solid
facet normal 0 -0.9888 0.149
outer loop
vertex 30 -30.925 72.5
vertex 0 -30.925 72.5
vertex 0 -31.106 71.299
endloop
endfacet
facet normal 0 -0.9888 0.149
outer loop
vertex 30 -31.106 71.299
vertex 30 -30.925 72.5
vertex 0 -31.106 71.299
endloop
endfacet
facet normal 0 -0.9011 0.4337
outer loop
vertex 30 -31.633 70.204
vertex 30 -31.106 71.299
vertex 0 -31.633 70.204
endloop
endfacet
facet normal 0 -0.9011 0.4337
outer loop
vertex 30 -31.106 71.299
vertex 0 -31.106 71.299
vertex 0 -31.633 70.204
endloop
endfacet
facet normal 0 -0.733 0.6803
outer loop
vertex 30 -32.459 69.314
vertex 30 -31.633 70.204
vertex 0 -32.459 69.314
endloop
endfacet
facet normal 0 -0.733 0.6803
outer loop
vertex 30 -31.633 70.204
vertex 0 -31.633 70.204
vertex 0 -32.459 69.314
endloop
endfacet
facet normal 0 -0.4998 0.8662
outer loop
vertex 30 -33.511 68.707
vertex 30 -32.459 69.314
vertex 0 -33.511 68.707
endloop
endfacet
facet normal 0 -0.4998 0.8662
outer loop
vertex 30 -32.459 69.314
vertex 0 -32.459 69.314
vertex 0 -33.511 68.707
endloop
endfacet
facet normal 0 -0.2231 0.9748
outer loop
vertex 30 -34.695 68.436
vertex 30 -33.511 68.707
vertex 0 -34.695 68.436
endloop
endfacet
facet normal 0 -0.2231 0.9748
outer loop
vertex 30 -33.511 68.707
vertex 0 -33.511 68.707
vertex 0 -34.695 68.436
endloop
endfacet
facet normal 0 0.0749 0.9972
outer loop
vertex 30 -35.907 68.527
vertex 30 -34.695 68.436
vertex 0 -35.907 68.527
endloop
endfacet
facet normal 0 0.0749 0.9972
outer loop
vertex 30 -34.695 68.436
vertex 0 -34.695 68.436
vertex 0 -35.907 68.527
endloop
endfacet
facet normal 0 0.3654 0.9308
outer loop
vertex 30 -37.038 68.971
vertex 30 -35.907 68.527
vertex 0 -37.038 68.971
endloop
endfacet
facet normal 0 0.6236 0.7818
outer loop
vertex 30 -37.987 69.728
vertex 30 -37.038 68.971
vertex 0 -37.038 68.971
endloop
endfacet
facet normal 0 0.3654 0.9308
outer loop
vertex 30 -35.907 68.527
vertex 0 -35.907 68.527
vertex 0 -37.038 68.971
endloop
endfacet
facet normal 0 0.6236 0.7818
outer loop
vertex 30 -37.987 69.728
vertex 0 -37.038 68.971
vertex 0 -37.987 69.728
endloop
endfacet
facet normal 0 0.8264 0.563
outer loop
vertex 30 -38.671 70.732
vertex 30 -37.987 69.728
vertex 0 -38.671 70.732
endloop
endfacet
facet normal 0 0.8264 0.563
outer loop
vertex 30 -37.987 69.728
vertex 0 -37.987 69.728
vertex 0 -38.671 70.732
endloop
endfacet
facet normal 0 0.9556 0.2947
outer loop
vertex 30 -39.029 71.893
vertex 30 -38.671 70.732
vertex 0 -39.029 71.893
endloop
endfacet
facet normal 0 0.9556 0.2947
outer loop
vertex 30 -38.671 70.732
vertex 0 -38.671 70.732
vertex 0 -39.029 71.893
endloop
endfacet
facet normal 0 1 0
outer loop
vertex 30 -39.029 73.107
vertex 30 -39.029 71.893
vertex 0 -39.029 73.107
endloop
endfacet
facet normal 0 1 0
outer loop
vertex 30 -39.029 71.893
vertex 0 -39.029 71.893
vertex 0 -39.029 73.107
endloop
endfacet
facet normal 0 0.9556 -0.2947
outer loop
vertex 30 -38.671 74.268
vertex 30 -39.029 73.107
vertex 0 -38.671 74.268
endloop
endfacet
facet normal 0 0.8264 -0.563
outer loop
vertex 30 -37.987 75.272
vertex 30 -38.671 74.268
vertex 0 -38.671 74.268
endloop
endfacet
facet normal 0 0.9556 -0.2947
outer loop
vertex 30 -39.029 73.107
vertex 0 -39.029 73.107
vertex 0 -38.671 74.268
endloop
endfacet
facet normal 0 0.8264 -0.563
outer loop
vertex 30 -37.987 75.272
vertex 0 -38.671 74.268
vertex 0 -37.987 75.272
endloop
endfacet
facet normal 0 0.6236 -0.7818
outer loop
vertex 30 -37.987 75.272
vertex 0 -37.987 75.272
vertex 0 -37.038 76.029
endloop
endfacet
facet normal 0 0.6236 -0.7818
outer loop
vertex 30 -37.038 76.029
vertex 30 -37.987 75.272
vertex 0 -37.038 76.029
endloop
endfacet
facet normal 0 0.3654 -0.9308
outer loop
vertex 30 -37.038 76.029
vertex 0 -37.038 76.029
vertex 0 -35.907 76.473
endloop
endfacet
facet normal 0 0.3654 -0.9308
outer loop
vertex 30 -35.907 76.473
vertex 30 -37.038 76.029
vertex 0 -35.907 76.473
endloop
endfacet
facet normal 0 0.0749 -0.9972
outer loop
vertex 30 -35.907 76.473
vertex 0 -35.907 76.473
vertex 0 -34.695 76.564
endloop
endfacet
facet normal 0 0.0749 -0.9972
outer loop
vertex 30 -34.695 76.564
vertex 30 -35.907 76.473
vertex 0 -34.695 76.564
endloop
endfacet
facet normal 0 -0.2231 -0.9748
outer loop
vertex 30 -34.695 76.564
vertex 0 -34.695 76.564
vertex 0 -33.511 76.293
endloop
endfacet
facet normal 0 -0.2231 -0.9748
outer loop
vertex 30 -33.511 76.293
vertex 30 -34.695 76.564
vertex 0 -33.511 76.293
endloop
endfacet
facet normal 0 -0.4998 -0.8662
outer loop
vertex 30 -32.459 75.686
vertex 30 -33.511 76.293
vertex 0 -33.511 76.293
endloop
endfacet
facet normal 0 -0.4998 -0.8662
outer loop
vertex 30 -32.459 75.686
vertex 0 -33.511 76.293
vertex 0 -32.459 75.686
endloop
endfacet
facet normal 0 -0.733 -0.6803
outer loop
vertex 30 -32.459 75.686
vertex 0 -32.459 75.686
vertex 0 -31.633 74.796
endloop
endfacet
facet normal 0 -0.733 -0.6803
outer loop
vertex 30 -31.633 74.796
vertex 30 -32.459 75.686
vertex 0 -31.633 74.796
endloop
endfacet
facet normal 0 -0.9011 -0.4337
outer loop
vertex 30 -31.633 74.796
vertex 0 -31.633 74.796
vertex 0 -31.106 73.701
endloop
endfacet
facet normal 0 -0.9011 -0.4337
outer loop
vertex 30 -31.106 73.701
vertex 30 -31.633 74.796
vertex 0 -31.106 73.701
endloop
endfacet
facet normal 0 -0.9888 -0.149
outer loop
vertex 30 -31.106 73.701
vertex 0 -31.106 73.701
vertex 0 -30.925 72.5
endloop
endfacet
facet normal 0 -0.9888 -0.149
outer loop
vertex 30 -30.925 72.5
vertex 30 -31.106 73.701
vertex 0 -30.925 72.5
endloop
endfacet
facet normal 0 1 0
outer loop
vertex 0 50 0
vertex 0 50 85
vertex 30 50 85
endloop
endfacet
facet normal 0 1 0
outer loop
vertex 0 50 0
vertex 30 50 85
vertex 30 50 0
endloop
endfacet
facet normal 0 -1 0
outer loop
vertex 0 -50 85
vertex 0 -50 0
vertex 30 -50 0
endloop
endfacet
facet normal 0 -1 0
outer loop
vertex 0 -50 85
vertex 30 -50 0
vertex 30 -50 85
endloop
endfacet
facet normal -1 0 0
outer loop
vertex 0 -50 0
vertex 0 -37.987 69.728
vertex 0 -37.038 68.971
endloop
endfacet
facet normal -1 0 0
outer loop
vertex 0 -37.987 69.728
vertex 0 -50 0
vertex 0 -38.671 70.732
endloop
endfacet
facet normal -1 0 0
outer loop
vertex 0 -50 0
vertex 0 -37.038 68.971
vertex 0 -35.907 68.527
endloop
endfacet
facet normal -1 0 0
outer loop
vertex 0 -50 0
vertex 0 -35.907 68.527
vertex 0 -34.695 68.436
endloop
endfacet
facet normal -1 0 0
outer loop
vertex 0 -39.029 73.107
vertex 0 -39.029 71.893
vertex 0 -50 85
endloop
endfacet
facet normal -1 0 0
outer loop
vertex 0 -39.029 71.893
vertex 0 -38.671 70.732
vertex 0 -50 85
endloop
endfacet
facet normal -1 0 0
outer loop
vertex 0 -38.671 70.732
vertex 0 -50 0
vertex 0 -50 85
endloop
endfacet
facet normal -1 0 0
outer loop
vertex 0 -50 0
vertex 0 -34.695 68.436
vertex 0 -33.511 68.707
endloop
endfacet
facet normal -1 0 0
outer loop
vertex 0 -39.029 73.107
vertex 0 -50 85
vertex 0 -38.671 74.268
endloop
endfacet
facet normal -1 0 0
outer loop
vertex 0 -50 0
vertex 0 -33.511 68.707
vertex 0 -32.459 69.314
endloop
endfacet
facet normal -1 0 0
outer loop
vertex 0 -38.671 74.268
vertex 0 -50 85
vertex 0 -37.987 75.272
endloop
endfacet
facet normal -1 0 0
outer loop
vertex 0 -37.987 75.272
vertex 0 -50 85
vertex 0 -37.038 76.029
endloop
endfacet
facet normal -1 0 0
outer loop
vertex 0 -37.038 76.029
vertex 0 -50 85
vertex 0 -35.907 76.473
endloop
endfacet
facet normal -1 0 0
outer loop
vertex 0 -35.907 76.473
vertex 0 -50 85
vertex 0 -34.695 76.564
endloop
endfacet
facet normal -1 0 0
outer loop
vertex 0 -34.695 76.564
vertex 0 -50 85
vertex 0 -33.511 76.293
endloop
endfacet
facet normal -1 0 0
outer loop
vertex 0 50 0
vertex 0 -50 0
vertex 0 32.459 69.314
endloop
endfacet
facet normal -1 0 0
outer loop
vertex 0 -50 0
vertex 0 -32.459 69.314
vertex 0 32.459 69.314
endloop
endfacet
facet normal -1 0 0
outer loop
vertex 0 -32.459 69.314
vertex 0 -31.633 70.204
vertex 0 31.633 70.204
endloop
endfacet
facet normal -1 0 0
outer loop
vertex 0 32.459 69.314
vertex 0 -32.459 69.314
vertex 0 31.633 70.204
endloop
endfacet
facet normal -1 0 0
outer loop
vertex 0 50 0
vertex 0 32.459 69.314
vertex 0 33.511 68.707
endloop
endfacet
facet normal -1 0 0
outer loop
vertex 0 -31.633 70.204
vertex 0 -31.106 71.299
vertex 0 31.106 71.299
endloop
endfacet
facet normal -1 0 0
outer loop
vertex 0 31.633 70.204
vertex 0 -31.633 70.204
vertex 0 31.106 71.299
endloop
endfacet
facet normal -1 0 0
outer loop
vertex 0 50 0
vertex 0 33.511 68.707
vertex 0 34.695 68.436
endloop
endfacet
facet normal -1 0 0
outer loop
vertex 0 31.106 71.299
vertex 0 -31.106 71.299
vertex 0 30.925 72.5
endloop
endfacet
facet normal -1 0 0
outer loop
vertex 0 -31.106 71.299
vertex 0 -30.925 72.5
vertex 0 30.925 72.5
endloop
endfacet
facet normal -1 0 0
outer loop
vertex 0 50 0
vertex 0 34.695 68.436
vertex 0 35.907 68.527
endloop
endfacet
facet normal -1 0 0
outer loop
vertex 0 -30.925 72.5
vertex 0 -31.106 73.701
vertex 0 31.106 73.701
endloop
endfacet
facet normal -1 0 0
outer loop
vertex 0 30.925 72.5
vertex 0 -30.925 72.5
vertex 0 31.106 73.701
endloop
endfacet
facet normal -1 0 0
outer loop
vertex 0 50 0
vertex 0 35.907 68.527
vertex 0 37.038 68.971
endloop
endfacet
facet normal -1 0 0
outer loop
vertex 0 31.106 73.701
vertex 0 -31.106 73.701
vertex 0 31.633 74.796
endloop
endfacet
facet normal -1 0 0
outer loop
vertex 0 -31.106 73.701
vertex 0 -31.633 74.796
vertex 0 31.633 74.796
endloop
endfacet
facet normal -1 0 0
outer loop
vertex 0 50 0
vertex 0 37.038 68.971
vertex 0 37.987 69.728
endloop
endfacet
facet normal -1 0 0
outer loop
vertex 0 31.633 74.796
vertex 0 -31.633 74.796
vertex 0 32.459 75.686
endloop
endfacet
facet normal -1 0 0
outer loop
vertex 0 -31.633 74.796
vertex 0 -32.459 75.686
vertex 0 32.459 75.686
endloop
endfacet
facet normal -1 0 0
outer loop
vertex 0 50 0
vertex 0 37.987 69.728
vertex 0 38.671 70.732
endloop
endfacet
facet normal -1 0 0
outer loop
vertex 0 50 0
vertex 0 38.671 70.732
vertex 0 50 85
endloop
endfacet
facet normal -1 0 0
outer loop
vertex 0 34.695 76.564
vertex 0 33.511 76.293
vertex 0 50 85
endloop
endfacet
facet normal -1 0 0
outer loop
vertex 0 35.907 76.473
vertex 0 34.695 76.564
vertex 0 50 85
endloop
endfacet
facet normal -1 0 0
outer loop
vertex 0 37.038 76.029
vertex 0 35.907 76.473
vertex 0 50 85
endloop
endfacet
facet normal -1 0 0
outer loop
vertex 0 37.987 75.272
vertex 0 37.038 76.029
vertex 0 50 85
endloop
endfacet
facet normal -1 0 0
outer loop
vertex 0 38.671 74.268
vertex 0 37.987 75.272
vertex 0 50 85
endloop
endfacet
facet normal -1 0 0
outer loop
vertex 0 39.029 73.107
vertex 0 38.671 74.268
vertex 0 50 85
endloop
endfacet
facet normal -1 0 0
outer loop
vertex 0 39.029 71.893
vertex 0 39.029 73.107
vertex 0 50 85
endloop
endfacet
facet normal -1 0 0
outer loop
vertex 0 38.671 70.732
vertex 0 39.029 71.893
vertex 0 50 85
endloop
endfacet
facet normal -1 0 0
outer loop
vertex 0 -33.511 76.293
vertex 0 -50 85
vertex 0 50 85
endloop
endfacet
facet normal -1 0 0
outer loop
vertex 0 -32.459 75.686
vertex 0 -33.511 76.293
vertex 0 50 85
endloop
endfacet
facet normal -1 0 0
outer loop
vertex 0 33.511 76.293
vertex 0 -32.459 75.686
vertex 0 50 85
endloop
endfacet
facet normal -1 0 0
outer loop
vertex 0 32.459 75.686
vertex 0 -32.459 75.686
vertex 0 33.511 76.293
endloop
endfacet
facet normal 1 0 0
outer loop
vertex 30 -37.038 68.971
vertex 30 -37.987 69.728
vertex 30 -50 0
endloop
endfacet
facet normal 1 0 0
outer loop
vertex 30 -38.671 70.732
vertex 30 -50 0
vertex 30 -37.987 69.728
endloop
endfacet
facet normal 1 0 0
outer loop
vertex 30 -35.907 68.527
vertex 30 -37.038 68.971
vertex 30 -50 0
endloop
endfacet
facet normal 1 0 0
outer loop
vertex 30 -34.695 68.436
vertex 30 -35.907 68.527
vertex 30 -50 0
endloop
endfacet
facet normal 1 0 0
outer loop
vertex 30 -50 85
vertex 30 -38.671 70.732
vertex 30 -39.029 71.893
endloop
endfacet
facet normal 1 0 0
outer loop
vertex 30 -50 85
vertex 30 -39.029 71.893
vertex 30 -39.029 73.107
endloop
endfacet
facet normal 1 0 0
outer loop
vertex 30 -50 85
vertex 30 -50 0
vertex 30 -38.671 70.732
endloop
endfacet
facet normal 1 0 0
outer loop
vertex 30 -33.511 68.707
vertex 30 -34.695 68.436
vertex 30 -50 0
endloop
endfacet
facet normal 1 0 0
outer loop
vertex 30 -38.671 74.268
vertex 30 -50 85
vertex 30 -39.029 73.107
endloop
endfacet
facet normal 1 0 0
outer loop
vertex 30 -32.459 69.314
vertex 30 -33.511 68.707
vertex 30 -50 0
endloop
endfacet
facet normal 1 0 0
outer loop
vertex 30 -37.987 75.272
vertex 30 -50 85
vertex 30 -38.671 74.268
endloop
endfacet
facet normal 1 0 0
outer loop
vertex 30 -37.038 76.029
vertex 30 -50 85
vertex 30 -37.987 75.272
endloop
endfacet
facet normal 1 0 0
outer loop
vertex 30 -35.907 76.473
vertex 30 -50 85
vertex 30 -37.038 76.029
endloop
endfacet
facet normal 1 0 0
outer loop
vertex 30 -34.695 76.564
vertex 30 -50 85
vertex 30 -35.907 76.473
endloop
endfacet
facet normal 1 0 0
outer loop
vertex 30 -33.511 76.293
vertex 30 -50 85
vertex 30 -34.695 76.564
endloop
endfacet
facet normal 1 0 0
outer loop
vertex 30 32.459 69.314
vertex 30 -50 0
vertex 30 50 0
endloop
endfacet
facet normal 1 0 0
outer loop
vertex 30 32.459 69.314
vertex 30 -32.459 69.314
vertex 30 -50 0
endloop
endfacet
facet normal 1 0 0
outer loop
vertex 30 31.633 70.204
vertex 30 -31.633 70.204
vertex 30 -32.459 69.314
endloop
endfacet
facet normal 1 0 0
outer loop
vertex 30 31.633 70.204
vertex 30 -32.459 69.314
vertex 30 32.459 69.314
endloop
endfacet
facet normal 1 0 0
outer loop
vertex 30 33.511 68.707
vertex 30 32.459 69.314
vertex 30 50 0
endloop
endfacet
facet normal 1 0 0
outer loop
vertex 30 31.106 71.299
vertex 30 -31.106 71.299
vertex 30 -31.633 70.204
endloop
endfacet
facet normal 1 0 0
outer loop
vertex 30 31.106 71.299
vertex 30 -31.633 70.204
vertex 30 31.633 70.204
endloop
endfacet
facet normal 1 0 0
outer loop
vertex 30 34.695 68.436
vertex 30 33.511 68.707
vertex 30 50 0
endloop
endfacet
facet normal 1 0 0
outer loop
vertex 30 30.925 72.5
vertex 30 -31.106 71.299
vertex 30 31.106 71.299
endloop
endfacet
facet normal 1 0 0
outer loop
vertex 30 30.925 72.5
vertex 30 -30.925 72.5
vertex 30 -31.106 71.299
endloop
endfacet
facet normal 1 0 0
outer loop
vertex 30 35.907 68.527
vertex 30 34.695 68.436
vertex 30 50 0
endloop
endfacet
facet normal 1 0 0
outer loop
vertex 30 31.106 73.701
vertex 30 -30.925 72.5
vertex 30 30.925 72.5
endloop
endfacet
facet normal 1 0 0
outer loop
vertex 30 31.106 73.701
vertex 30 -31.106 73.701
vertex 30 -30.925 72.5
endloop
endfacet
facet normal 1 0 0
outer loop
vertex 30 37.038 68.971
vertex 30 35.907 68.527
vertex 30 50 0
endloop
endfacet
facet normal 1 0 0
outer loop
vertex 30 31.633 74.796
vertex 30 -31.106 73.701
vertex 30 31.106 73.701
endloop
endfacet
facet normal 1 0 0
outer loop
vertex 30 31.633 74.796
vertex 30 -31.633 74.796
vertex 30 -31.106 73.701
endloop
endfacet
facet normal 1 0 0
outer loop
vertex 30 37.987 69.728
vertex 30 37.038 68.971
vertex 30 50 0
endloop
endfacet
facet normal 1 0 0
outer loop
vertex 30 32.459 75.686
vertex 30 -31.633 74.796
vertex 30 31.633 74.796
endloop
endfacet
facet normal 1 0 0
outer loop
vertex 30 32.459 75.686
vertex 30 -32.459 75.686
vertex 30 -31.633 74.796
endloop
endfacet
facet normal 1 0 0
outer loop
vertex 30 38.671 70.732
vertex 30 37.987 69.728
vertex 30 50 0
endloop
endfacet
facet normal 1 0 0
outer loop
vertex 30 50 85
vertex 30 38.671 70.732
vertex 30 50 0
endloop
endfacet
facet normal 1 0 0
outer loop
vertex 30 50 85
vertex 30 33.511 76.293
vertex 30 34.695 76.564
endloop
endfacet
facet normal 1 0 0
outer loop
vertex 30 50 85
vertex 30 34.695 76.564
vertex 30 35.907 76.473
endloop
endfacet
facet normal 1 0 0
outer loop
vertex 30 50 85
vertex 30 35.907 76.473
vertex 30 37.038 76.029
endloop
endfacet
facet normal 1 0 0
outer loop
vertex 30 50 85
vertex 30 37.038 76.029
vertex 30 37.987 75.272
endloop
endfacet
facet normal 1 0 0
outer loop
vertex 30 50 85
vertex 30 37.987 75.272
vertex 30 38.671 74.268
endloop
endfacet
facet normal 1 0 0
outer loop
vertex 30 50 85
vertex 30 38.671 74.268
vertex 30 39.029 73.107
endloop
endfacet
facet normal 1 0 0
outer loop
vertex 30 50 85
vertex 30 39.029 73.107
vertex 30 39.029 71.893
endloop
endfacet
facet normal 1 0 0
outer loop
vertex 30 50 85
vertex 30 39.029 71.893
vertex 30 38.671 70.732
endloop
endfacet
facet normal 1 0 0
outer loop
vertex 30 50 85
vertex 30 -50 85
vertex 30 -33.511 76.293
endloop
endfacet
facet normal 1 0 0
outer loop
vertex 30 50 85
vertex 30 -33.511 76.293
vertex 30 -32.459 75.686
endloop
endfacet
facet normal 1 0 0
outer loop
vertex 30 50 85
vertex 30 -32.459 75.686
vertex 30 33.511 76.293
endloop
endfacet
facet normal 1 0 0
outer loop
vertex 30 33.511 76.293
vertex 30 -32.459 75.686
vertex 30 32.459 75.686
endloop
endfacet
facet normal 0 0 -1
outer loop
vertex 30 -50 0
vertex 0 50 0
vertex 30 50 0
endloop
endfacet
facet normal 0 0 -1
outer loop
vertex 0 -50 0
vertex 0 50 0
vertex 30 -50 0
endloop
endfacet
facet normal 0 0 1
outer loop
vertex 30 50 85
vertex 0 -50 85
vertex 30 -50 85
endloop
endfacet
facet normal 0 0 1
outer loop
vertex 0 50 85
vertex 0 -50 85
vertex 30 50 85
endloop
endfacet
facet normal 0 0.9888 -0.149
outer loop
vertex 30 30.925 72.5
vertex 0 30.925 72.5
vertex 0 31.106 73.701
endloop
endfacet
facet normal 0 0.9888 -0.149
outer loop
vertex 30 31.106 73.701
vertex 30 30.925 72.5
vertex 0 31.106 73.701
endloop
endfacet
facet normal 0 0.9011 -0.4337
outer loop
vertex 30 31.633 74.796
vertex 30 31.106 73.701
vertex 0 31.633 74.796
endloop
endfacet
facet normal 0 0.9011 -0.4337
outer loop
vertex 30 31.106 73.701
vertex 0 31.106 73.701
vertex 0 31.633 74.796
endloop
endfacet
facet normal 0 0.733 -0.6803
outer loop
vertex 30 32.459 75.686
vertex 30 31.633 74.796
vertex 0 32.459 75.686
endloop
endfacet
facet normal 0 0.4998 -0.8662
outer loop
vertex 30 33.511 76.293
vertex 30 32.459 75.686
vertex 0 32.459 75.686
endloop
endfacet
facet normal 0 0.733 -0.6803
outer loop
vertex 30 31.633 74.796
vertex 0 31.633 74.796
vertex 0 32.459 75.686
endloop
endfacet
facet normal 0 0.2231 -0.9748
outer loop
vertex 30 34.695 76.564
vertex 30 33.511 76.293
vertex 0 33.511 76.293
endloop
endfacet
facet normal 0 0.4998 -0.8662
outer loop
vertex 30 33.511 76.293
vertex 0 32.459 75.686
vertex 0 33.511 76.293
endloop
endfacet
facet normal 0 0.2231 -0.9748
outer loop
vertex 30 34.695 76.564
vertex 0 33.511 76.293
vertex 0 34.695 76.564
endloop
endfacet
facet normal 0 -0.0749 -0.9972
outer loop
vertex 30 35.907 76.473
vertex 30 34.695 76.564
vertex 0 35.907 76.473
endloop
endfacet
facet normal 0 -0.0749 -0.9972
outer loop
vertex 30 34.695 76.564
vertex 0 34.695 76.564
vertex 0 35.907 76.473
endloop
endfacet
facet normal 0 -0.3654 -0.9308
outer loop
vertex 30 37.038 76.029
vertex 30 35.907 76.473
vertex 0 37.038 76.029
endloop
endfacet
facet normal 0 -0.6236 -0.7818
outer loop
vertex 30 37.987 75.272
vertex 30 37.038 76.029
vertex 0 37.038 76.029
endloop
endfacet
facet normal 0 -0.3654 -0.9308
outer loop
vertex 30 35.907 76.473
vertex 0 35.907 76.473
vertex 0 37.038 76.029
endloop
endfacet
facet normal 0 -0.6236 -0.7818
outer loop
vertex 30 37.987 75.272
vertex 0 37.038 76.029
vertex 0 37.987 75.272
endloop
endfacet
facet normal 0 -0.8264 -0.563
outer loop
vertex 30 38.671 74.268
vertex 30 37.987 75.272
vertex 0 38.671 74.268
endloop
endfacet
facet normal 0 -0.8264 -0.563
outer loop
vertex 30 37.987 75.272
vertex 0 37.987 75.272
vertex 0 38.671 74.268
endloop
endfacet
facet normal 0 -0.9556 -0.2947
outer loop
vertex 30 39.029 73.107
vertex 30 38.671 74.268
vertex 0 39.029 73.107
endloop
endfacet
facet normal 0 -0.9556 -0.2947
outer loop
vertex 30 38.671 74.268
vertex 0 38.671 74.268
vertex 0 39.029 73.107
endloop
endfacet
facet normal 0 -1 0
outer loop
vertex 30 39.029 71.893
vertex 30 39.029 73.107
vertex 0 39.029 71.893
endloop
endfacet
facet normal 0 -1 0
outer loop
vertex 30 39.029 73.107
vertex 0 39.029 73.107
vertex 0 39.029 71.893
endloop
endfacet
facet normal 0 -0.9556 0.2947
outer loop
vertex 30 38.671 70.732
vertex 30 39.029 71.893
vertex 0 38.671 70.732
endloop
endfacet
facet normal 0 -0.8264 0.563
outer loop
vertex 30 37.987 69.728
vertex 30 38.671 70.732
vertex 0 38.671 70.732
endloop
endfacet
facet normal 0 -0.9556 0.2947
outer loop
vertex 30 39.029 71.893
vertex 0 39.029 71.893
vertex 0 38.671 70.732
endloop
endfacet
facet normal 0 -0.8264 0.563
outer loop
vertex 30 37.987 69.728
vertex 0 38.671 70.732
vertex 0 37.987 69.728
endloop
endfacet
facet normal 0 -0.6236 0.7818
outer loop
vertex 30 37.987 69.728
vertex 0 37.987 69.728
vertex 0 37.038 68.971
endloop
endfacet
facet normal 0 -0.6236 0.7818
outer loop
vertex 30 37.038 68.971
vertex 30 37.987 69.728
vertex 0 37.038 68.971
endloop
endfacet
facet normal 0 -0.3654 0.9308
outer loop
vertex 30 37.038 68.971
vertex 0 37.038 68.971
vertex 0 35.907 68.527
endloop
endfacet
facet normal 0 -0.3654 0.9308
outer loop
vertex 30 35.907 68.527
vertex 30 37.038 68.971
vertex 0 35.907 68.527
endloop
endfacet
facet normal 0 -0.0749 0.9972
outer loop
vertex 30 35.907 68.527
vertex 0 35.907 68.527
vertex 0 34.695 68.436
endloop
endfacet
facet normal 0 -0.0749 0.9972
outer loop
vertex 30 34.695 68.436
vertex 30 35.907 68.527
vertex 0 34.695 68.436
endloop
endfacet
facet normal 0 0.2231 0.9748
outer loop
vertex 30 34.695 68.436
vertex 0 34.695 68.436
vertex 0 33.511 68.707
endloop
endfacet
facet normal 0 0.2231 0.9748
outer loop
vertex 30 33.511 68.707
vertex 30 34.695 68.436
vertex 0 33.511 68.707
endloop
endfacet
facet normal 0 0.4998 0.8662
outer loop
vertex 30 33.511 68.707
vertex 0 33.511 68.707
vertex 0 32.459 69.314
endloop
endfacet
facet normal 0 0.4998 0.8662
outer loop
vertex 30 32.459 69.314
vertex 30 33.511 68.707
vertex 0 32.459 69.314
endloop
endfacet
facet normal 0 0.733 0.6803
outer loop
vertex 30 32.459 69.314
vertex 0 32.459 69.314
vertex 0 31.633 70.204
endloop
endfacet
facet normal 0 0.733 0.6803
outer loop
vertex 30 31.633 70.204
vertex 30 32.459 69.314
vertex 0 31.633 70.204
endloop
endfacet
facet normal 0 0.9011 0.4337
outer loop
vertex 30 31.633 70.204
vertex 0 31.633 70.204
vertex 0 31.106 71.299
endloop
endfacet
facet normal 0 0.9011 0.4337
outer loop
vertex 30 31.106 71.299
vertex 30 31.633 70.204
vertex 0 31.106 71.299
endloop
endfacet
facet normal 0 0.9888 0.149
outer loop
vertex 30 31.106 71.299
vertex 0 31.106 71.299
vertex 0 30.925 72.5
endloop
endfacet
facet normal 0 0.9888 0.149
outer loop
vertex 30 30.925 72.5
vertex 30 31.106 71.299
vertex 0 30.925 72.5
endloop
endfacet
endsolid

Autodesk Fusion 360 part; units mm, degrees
sketch "Esquisse1" plane through (0, 0, 0) normal (1, 0, 0) x (0, 1, 0)
  line L0 (-50, 85) -> (50, 85)
  line L1 (50, 85) -> (50, 0)
  line L2 (50, 0) -> (-50, 0)
  line L3 (-50, 0) -> (-50, 85)
  line L4 (0, 1.75) -> (0, 22.5)
  dimension "d1" = 85
  dimension "d2" = 100
extrude "Extrusion1" add sketch "Esquisse1" along normal blind 30
sketch "Esquisse2" plane through (0, 0, 0) normal (-1, 0, 0) x (0, -1, 0)
  line L0 (-50, 0) -> (50, 0)
  line L1 (50, 0) -> (50, 85)
  line L2 (50, 85) -> (-50, 85)
  line L3 (-50, 85) -> (-50, 0)
  circle A0 centre (-35, 72.5) radius 4.075
  line L4 (0, 1.75) -> (0, 22.5)
  dimension "d5" = 8.15
  dimension "d6" = 12.5
  dimension "d7" = 35
extrude "Extrusion2" cut sketch "Esquisse2" against normal blind 40 contours A0
mirror "Symétrie miroir1" about plane through (0, 0, 0) normal (0, 1, 0) of "Extrusion2"
equation "d7 = ( 70 / 2 ) * 1 mm"
